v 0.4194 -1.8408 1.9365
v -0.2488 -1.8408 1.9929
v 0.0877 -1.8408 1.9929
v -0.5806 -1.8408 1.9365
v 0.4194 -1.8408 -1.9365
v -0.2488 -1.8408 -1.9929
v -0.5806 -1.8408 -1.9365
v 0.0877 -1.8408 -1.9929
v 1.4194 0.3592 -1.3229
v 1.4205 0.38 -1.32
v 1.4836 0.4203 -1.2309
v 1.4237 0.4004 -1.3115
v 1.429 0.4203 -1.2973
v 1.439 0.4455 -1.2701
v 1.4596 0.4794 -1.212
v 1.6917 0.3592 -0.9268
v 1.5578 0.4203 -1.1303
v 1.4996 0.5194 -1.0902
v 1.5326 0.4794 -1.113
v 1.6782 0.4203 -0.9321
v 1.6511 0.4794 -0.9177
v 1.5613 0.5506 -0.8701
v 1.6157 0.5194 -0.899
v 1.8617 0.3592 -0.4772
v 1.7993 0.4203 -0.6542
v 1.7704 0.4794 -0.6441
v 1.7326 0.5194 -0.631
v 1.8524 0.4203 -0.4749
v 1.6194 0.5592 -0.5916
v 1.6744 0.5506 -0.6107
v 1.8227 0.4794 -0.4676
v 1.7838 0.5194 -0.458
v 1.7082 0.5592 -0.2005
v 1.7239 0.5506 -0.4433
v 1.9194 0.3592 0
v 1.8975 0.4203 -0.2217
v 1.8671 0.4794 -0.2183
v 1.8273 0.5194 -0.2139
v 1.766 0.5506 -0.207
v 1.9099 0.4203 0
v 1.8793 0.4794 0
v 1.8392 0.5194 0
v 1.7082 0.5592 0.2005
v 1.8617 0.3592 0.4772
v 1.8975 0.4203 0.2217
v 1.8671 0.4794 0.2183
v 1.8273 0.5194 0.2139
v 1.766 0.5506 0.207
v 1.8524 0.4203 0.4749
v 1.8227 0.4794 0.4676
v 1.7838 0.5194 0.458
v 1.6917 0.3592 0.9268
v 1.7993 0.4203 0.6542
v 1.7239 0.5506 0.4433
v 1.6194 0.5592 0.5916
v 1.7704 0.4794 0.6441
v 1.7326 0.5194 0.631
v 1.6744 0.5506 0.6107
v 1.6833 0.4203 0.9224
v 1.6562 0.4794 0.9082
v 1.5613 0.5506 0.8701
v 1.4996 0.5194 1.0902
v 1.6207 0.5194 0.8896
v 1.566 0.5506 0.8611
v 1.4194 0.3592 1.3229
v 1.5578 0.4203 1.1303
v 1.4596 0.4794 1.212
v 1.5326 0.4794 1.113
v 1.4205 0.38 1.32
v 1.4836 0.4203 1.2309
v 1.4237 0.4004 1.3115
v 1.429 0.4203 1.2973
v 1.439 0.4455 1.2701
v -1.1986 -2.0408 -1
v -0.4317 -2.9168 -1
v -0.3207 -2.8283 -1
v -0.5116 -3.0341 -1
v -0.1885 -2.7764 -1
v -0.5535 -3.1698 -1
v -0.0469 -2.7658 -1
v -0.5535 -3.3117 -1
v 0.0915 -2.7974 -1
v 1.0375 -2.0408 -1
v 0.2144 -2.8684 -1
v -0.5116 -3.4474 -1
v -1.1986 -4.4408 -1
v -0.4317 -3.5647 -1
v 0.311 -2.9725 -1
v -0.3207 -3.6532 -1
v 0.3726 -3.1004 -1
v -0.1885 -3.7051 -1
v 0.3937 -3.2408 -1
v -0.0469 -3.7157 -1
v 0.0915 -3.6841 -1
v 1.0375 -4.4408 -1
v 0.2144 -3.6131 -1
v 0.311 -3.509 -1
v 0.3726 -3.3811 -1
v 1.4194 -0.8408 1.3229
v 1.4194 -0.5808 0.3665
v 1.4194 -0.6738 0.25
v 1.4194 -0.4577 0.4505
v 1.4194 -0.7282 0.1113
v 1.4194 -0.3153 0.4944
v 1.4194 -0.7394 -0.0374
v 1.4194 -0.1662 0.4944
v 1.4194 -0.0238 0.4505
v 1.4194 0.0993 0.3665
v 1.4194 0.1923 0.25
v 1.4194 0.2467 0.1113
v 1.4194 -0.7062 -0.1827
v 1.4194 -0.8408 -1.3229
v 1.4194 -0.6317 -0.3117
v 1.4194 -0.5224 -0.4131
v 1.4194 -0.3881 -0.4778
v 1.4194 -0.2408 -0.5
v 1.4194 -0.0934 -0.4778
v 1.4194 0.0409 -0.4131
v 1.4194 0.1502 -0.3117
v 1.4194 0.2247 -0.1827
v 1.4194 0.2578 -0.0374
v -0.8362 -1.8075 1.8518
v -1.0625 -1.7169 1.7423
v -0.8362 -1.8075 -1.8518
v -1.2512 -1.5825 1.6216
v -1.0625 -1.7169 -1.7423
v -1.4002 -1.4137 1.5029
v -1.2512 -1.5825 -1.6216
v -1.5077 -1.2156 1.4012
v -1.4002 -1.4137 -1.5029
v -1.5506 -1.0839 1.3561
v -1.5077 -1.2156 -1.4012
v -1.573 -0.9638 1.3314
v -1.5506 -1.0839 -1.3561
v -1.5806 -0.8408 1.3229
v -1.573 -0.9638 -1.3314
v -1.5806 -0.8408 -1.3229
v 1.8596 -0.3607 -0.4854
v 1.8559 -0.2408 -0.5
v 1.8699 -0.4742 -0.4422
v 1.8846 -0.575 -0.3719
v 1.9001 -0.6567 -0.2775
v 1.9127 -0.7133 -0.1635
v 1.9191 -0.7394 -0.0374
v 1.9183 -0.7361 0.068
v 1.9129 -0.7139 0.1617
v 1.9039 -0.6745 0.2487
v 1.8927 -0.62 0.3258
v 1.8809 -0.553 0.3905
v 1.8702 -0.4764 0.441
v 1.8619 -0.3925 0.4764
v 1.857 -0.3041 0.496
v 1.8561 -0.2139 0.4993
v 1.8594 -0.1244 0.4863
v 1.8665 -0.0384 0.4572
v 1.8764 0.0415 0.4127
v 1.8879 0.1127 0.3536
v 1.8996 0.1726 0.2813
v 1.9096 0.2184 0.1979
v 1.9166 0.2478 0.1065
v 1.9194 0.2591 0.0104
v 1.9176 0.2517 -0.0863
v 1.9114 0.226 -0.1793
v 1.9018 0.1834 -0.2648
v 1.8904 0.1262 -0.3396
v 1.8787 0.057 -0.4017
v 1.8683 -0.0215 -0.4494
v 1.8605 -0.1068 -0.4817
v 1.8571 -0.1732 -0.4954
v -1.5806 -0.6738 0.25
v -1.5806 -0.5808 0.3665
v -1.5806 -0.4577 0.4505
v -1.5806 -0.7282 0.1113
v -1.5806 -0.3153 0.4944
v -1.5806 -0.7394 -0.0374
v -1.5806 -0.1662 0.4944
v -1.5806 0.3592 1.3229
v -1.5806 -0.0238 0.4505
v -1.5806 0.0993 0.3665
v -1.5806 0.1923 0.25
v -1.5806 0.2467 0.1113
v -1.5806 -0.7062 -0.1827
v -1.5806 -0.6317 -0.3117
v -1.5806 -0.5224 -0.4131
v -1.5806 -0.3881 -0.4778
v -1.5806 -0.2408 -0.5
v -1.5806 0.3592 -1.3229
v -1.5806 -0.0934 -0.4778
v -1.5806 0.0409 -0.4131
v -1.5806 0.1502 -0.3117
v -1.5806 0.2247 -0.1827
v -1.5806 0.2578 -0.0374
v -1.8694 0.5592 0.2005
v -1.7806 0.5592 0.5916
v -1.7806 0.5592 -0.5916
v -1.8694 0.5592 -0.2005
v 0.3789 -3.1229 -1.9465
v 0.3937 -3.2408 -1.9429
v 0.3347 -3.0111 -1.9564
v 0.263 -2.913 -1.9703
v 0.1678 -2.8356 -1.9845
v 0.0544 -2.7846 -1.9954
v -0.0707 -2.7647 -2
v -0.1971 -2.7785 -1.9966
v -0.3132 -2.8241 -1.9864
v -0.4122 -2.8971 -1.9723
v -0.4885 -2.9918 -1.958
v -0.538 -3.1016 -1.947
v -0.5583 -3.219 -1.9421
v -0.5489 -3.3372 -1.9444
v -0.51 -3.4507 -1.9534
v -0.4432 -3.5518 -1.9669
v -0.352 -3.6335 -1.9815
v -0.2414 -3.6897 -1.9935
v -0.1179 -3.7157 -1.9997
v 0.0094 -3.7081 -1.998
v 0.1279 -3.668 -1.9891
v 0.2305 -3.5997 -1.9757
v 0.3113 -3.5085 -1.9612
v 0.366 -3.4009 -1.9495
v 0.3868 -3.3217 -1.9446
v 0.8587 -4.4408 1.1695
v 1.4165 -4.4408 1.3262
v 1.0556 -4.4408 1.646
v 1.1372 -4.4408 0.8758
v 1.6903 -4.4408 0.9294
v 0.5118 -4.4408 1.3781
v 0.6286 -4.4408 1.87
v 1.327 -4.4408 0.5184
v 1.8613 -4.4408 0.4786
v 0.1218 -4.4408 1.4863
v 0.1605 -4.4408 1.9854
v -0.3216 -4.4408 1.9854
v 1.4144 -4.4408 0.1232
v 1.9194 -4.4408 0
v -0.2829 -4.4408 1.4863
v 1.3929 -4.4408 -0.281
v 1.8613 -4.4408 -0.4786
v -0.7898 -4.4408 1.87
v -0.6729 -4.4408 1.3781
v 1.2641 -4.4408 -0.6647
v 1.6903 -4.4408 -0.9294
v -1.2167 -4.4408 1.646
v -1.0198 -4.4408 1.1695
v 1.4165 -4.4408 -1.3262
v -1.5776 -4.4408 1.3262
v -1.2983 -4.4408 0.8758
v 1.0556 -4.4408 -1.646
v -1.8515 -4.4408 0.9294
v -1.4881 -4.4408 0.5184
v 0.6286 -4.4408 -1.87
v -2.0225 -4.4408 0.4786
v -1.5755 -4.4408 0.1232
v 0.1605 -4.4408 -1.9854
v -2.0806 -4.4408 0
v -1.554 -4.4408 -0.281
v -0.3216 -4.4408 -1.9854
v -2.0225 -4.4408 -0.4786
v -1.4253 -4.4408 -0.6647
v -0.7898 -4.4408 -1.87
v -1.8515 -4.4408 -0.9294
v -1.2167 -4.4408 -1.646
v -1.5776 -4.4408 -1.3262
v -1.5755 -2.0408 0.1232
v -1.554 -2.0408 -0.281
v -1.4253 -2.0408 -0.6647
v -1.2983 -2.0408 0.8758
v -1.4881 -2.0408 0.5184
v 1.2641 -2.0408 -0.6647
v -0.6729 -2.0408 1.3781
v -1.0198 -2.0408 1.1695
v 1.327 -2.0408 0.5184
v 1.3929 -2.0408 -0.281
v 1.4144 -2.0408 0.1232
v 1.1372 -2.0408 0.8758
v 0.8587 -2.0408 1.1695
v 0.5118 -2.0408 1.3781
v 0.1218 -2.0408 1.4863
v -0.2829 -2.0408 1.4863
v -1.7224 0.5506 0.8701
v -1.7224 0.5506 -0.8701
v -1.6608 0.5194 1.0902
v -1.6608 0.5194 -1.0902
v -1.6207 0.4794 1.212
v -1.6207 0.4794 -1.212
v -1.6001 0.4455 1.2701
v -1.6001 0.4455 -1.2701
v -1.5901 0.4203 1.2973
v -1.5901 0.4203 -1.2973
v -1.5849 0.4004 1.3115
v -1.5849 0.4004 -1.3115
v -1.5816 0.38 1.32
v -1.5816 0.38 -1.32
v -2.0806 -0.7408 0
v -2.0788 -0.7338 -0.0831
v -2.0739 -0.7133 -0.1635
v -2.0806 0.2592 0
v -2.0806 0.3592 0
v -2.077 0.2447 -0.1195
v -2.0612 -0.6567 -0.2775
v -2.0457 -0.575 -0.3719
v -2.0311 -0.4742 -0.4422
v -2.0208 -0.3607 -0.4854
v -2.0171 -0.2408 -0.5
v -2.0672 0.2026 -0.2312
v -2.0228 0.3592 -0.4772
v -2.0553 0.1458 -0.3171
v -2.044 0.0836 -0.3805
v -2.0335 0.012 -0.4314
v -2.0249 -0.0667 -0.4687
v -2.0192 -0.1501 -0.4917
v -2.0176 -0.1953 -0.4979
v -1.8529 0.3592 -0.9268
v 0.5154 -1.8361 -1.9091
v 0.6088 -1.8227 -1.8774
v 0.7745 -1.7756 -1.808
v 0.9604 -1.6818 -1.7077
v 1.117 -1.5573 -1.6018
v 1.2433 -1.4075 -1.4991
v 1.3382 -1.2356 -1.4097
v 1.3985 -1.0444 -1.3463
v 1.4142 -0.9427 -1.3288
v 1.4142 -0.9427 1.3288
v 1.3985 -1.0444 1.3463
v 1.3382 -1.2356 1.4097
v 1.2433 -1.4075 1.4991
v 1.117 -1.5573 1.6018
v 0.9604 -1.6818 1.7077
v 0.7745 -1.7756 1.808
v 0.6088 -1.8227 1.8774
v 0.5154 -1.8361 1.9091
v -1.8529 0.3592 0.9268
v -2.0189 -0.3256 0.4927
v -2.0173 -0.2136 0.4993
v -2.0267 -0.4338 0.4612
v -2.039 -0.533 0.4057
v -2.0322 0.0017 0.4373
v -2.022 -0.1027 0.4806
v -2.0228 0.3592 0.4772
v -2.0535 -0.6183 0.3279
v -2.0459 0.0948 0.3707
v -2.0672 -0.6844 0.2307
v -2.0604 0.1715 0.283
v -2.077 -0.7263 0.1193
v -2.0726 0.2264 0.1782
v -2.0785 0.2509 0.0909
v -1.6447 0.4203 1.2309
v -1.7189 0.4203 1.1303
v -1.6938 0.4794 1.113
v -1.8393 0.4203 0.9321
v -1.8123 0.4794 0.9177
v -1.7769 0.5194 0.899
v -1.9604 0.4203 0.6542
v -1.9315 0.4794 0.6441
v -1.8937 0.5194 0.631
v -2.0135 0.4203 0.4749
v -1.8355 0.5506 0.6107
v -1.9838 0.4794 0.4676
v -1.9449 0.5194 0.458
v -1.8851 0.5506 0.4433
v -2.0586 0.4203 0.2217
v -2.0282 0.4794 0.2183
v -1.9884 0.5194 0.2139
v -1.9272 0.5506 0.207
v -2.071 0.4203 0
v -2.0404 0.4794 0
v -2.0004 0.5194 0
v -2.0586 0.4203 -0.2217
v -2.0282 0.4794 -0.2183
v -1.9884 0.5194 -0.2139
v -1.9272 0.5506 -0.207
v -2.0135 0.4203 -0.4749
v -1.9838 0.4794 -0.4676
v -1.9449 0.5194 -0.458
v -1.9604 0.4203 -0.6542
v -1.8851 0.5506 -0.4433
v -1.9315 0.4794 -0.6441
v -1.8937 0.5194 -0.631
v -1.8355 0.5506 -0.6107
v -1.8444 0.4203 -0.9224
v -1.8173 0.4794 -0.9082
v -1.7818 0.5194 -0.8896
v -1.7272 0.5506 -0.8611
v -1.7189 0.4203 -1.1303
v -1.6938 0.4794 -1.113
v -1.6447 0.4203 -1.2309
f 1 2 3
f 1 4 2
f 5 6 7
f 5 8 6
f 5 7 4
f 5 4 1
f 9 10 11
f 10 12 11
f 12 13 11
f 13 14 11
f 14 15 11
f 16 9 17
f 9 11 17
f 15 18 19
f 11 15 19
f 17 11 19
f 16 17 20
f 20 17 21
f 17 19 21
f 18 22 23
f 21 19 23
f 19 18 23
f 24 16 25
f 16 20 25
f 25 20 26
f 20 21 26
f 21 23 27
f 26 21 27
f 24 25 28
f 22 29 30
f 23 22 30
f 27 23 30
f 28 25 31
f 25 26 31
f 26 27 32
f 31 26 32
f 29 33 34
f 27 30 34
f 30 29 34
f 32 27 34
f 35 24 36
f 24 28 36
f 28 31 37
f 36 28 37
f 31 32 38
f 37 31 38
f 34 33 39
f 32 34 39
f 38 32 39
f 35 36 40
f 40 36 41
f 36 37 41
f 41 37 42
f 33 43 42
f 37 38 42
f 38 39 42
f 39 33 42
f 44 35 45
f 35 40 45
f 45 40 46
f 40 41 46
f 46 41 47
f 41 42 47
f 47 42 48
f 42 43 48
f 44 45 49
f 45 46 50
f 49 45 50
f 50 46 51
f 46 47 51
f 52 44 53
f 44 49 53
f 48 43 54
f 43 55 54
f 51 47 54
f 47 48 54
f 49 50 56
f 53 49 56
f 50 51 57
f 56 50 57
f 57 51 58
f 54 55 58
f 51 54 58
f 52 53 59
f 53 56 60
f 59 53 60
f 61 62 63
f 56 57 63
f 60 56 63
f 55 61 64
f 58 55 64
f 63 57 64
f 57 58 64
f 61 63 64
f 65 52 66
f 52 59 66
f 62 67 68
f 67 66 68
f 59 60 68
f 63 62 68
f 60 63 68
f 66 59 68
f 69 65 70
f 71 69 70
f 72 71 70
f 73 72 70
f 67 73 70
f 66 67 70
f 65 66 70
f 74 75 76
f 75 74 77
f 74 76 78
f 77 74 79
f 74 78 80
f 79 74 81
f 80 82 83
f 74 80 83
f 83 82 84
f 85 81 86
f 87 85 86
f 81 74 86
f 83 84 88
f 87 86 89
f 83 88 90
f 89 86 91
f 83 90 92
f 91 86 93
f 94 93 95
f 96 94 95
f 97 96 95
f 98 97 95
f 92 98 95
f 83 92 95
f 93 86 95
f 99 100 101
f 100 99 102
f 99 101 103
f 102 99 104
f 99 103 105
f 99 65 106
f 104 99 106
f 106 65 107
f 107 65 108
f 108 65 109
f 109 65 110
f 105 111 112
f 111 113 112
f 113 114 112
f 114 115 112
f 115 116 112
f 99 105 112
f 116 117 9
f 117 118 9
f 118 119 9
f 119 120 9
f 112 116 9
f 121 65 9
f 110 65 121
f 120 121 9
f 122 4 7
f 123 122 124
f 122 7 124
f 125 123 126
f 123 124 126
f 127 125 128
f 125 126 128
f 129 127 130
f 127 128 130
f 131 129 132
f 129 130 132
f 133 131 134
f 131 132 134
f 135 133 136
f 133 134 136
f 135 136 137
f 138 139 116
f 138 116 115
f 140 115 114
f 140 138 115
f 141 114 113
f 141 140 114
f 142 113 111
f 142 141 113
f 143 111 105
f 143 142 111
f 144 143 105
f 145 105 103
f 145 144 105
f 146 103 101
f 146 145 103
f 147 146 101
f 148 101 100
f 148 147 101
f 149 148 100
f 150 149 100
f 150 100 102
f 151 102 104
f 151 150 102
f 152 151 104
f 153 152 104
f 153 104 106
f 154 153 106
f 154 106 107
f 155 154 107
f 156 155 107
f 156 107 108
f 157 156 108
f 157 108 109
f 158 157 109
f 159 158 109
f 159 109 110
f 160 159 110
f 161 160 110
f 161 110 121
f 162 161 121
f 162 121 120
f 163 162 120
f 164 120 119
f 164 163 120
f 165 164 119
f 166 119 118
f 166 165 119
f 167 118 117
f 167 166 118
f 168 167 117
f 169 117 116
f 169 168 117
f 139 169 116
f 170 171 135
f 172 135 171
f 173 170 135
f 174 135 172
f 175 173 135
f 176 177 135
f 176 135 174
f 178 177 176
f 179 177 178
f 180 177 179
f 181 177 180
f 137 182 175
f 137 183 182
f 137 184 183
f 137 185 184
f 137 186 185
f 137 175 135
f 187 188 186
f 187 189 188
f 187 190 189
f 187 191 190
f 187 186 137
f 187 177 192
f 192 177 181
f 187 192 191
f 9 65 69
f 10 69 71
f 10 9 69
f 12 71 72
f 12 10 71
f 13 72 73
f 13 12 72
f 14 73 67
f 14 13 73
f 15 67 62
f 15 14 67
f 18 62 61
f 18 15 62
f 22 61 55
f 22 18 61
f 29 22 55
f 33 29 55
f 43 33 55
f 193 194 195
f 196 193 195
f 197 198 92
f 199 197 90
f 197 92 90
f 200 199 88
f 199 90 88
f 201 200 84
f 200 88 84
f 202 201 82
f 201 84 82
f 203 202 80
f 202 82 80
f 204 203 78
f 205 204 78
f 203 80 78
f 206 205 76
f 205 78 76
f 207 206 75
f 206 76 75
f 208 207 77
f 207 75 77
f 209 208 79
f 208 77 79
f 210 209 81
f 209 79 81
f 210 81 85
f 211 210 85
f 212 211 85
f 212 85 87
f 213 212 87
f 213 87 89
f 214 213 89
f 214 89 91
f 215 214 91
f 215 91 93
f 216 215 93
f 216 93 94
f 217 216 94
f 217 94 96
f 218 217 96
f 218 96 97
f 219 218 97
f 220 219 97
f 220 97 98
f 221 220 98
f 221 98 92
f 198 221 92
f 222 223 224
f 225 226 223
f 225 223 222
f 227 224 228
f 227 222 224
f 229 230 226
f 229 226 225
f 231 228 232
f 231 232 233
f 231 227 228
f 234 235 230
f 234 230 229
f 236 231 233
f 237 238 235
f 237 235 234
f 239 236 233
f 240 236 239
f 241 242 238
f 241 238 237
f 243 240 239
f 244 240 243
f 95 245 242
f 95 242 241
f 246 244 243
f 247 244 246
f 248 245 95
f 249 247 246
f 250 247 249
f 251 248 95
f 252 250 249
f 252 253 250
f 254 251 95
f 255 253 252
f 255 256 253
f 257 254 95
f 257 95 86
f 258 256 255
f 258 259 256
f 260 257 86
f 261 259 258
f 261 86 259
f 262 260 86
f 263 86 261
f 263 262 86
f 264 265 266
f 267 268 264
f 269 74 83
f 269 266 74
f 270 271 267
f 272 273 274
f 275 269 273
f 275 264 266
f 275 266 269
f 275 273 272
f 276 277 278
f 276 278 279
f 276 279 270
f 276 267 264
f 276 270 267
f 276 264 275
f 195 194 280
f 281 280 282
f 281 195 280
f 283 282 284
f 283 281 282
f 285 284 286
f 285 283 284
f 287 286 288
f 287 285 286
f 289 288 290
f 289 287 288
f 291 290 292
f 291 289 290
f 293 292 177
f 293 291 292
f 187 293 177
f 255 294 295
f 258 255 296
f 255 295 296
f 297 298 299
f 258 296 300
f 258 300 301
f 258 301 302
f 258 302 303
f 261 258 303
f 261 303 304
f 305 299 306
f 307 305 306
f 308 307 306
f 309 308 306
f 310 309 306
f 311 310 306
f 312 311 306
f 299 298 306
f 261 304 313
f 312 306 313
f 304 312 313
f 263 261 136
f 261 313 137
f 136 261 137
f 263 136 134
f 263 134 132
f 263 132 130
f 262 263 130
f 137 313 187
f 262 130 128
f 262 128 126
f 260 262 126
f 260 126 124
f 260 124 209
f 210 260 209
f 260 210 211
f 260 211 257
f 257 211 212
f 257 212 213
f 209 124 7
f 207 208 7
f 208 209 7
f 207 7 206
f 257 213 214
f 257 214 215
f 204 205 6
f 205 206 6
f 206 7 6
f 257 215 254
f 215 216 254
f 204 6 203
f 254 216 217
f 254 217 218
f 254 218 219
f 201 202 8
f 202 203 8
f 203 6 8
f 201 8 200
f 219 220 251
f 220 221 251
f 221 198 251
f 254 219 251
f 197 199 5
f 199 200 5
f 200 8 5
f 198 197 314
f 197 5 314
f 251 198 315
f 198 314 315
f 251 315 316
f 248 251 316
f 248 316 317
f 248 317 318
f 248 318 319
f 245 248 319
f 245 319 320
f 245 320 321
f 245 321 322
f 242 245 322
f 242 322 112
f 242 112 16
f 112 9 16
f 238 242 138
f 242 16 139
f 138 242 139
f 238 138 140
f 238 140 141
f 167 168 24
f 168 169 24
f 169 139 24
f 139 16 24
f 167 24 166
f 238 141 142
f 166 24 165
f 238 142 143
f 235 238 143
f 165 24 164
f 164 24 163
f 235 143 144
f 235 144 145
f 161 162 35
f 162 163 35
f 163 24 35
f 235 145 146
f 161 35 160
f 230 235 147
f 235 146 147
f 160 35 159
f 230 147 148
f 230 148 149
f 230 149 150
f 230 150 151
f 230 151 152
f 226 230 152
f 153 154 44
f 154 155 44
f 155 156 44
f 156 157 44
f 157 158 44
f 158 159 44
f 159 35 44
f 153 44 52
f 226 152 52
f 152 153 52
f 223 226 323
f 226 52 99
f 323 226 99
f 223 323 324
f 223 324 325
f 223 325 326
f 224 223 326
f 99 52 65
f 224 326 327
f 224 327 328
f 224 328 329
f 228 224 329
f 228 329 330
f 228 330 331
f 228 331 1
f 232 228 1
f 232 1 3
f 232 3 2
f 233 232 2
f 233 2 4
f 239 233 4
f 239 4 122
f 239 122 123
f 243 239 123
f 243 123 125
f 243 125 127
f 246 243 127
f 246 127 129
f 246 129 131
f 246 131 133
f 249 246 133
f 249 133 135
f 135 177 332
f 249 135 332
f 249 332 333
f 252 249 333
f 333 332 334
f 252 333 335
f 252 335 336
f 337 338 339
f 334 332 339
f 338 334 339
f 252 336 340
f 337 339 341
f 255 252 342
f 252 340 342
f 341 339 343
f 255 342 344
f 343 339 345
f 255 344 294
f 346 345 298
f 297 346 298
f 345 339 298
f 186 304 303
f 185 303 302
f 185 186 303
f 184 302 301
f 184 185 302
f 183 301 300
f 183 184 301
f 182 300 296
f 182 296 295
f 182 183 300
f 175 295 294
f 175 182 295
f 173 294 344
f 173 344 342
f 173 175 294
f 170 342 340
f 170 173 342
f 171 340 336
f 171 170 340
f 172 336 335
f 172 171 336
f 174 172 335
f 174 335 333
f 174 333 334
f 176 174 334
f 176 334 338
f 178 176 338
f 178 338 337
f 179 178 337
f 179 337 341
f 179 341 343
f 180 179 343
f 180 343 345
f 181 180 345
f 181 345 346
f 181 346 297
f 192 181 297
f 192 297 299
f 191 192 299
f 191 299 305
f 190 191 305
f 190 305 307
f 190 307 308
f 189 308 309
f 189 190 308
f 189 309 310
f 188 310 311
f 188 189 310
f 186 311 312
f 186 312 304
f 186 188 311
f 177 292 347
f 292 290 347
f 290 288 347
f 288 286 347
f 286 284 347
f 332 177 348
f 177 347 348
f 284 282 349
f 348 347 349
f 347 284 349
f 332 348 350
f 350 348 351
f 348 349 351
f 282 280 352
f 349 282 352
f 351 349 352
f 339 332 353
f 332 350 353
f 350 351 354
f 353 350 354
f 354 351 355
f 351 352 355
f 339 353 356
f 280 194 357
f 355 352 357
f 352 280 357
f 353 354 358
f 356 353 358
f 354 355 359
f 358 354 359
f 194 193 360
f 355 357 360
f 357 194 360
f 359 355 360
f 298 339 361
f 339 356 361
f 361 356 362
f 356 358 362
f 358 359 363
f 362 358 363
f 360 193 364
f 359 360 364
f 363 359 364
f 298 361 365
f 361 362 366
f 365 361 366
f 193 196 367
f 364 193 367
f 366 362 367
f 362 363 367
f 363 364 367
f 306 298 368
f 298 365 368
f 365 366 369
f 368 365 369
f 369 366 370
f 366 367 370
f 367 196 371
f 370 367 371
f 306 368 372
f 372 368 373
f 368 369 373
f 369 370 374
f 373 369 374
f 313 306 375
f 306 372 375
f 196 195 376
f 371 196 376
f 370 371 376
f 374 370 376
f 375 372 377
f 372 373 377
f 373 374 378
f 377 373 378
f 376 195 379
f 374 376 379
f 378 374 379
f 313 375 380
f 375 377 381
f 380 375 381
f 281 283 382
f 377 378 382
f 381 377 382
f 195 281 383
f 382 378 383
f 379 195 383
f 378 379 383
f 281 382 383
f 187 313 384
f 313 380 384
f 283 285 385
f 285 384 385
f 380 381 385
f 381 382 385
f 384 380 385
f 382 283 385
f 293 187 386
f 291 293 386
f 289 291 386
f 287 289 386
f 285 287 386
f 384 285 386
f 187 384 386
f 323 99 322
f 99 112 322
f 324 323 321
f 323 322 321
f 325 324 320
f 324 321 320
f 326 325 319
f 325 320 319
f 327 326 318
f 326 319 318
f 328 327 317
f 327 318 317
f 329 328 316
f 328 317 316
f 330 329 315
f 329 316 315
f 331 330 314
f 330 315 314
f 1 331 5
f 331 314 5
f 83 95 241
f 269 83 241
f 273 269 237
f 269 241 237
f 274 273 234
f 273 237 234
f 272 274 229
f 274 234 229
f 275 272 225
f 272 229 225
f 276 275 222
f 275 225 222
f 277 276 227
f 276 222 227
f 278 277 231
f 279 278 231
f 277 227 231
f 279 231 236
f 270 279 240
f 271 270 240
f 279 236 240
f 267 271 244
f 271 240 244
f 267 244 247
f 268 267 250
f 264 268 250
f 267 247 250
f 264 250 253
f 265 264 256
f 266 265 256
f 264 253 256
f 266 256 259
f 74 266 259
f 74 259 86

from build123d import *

# Parameters (mm, degrees)
CROQUIS1_W                 = 2
CROQUIS1_H                 = 5
CROQUIS2_W                 = 3
CROQUIS2_H                 = 4
CORTAR_EXTRUIR1_DEPTH      = 2.4
CORTAR_EXTRUIR2_DEPTH      = 2.4
REDONDEO1_R                = 0.2
REDONDEO2_R                = 1
CORTAR_EXTRUIR3_DEPTH      = 4.4
CORTAR_EXTRUIR3_DEPTH_BACK = 2.4
CROQUIS4_R                 = 0.5
CROQUIS5_R                 = 0.47625
CORTAR_EXTRUIR4_DEPTH      = 2.5


with BuildPart() as part:
    # Croquis1 → Revolución1 (revolve)
    with BuildSketch(Plane.XY):
        with Locations((-1.08056872, -1.940758294)):
            Rectangle(CROQUIS1_W, CROQUIS1_H)
    revolve(axis=Axis((-0.08056872, 0.559241706, 0), (0, -1, 0)))

    # Croquis2 → Cortar-Extruir1 (cut)
    with BuildSketch(Plane(origin=(0, 0.559241706, 0), x_dir=(1, 0, 0), z_dir=(0, 1, 0))):
        with Locations((-0.08056872, 0)):
            Rectangle(CROQUIS2_W, CROQUIS2_H)
    extrude(amount=-CORTAR_EXTRUIR1_DEPTH, mode=Mode.SUBTRACT)

    # Croquis3 → Cortar-Extruir2 (cut)
    with BuildSketch(Plane.XZ.offset(4.440758294)):
        with BuildLine():
            Line((-1.198602709, -1), (1.037465268, -1))
            ThreePointArc((1.037465268, -1), (-0.08056872, 1.5), (-1.198602709, -1))
        make_face()
    extrude(amount=-CORTAR_EXTRUIR2_DEPTH, mode=Mode.SUBTRACT)

    # Redondeo1
    redondeo1_edges = [part.edges().sort_by_distance(p)[0] for p in [
        (-1.951397414, 0.559241706, -0.707106781),
        (-1.58056872, 0.559241706, 0),
        (1.41943128, 0.559241706, 0),
        (1.91943128, 0.559241706, 0),
    ]]
    fillet(redondeo1_edges, radius=REDONDEO1_R)

    # Redondeo2
    redondeo2_edges = [part.edges().sort_by_distance(p)[0] for p in [
        (1.41943128, -1.840758294, 0),
        (-1.58056872, -1.840758294, 0),
    ]]
    fillet(redondeo2_edges, radius=REDONDEO2_R)

    # Croquis4 → Cortar-Extruir3 (cut, two sides: drawn at the far end of the back side and taken through both)
    with BuildSketch(Plane.ZY.offset(-1.41943128).offset(-CORTAR_EXTRUIR3_DEPTH_BACK)):
        with Locations((0, -0.240758294)):
            Circle(CROQUIS4_R)
    extrude(amount=CORTAR_EXTRUIR3_DEPTH + CORTAR_EXTRUIR3_DEPTH_BACK, mode=Mode.SUBTRACT)

    # Croquis5 → Cortar-Extruir4 (cut)
    with BuildSketch(Plane.XY.offset(-1)):
        with Locations((-0.082534732, -3.240758294)):
            Circle(CROQUIS5_R)
    extrude(amount=-CORTAR_EXTRUIR4_DEPTH, mode=Mode.SUBTRACT)


solid = part.part
